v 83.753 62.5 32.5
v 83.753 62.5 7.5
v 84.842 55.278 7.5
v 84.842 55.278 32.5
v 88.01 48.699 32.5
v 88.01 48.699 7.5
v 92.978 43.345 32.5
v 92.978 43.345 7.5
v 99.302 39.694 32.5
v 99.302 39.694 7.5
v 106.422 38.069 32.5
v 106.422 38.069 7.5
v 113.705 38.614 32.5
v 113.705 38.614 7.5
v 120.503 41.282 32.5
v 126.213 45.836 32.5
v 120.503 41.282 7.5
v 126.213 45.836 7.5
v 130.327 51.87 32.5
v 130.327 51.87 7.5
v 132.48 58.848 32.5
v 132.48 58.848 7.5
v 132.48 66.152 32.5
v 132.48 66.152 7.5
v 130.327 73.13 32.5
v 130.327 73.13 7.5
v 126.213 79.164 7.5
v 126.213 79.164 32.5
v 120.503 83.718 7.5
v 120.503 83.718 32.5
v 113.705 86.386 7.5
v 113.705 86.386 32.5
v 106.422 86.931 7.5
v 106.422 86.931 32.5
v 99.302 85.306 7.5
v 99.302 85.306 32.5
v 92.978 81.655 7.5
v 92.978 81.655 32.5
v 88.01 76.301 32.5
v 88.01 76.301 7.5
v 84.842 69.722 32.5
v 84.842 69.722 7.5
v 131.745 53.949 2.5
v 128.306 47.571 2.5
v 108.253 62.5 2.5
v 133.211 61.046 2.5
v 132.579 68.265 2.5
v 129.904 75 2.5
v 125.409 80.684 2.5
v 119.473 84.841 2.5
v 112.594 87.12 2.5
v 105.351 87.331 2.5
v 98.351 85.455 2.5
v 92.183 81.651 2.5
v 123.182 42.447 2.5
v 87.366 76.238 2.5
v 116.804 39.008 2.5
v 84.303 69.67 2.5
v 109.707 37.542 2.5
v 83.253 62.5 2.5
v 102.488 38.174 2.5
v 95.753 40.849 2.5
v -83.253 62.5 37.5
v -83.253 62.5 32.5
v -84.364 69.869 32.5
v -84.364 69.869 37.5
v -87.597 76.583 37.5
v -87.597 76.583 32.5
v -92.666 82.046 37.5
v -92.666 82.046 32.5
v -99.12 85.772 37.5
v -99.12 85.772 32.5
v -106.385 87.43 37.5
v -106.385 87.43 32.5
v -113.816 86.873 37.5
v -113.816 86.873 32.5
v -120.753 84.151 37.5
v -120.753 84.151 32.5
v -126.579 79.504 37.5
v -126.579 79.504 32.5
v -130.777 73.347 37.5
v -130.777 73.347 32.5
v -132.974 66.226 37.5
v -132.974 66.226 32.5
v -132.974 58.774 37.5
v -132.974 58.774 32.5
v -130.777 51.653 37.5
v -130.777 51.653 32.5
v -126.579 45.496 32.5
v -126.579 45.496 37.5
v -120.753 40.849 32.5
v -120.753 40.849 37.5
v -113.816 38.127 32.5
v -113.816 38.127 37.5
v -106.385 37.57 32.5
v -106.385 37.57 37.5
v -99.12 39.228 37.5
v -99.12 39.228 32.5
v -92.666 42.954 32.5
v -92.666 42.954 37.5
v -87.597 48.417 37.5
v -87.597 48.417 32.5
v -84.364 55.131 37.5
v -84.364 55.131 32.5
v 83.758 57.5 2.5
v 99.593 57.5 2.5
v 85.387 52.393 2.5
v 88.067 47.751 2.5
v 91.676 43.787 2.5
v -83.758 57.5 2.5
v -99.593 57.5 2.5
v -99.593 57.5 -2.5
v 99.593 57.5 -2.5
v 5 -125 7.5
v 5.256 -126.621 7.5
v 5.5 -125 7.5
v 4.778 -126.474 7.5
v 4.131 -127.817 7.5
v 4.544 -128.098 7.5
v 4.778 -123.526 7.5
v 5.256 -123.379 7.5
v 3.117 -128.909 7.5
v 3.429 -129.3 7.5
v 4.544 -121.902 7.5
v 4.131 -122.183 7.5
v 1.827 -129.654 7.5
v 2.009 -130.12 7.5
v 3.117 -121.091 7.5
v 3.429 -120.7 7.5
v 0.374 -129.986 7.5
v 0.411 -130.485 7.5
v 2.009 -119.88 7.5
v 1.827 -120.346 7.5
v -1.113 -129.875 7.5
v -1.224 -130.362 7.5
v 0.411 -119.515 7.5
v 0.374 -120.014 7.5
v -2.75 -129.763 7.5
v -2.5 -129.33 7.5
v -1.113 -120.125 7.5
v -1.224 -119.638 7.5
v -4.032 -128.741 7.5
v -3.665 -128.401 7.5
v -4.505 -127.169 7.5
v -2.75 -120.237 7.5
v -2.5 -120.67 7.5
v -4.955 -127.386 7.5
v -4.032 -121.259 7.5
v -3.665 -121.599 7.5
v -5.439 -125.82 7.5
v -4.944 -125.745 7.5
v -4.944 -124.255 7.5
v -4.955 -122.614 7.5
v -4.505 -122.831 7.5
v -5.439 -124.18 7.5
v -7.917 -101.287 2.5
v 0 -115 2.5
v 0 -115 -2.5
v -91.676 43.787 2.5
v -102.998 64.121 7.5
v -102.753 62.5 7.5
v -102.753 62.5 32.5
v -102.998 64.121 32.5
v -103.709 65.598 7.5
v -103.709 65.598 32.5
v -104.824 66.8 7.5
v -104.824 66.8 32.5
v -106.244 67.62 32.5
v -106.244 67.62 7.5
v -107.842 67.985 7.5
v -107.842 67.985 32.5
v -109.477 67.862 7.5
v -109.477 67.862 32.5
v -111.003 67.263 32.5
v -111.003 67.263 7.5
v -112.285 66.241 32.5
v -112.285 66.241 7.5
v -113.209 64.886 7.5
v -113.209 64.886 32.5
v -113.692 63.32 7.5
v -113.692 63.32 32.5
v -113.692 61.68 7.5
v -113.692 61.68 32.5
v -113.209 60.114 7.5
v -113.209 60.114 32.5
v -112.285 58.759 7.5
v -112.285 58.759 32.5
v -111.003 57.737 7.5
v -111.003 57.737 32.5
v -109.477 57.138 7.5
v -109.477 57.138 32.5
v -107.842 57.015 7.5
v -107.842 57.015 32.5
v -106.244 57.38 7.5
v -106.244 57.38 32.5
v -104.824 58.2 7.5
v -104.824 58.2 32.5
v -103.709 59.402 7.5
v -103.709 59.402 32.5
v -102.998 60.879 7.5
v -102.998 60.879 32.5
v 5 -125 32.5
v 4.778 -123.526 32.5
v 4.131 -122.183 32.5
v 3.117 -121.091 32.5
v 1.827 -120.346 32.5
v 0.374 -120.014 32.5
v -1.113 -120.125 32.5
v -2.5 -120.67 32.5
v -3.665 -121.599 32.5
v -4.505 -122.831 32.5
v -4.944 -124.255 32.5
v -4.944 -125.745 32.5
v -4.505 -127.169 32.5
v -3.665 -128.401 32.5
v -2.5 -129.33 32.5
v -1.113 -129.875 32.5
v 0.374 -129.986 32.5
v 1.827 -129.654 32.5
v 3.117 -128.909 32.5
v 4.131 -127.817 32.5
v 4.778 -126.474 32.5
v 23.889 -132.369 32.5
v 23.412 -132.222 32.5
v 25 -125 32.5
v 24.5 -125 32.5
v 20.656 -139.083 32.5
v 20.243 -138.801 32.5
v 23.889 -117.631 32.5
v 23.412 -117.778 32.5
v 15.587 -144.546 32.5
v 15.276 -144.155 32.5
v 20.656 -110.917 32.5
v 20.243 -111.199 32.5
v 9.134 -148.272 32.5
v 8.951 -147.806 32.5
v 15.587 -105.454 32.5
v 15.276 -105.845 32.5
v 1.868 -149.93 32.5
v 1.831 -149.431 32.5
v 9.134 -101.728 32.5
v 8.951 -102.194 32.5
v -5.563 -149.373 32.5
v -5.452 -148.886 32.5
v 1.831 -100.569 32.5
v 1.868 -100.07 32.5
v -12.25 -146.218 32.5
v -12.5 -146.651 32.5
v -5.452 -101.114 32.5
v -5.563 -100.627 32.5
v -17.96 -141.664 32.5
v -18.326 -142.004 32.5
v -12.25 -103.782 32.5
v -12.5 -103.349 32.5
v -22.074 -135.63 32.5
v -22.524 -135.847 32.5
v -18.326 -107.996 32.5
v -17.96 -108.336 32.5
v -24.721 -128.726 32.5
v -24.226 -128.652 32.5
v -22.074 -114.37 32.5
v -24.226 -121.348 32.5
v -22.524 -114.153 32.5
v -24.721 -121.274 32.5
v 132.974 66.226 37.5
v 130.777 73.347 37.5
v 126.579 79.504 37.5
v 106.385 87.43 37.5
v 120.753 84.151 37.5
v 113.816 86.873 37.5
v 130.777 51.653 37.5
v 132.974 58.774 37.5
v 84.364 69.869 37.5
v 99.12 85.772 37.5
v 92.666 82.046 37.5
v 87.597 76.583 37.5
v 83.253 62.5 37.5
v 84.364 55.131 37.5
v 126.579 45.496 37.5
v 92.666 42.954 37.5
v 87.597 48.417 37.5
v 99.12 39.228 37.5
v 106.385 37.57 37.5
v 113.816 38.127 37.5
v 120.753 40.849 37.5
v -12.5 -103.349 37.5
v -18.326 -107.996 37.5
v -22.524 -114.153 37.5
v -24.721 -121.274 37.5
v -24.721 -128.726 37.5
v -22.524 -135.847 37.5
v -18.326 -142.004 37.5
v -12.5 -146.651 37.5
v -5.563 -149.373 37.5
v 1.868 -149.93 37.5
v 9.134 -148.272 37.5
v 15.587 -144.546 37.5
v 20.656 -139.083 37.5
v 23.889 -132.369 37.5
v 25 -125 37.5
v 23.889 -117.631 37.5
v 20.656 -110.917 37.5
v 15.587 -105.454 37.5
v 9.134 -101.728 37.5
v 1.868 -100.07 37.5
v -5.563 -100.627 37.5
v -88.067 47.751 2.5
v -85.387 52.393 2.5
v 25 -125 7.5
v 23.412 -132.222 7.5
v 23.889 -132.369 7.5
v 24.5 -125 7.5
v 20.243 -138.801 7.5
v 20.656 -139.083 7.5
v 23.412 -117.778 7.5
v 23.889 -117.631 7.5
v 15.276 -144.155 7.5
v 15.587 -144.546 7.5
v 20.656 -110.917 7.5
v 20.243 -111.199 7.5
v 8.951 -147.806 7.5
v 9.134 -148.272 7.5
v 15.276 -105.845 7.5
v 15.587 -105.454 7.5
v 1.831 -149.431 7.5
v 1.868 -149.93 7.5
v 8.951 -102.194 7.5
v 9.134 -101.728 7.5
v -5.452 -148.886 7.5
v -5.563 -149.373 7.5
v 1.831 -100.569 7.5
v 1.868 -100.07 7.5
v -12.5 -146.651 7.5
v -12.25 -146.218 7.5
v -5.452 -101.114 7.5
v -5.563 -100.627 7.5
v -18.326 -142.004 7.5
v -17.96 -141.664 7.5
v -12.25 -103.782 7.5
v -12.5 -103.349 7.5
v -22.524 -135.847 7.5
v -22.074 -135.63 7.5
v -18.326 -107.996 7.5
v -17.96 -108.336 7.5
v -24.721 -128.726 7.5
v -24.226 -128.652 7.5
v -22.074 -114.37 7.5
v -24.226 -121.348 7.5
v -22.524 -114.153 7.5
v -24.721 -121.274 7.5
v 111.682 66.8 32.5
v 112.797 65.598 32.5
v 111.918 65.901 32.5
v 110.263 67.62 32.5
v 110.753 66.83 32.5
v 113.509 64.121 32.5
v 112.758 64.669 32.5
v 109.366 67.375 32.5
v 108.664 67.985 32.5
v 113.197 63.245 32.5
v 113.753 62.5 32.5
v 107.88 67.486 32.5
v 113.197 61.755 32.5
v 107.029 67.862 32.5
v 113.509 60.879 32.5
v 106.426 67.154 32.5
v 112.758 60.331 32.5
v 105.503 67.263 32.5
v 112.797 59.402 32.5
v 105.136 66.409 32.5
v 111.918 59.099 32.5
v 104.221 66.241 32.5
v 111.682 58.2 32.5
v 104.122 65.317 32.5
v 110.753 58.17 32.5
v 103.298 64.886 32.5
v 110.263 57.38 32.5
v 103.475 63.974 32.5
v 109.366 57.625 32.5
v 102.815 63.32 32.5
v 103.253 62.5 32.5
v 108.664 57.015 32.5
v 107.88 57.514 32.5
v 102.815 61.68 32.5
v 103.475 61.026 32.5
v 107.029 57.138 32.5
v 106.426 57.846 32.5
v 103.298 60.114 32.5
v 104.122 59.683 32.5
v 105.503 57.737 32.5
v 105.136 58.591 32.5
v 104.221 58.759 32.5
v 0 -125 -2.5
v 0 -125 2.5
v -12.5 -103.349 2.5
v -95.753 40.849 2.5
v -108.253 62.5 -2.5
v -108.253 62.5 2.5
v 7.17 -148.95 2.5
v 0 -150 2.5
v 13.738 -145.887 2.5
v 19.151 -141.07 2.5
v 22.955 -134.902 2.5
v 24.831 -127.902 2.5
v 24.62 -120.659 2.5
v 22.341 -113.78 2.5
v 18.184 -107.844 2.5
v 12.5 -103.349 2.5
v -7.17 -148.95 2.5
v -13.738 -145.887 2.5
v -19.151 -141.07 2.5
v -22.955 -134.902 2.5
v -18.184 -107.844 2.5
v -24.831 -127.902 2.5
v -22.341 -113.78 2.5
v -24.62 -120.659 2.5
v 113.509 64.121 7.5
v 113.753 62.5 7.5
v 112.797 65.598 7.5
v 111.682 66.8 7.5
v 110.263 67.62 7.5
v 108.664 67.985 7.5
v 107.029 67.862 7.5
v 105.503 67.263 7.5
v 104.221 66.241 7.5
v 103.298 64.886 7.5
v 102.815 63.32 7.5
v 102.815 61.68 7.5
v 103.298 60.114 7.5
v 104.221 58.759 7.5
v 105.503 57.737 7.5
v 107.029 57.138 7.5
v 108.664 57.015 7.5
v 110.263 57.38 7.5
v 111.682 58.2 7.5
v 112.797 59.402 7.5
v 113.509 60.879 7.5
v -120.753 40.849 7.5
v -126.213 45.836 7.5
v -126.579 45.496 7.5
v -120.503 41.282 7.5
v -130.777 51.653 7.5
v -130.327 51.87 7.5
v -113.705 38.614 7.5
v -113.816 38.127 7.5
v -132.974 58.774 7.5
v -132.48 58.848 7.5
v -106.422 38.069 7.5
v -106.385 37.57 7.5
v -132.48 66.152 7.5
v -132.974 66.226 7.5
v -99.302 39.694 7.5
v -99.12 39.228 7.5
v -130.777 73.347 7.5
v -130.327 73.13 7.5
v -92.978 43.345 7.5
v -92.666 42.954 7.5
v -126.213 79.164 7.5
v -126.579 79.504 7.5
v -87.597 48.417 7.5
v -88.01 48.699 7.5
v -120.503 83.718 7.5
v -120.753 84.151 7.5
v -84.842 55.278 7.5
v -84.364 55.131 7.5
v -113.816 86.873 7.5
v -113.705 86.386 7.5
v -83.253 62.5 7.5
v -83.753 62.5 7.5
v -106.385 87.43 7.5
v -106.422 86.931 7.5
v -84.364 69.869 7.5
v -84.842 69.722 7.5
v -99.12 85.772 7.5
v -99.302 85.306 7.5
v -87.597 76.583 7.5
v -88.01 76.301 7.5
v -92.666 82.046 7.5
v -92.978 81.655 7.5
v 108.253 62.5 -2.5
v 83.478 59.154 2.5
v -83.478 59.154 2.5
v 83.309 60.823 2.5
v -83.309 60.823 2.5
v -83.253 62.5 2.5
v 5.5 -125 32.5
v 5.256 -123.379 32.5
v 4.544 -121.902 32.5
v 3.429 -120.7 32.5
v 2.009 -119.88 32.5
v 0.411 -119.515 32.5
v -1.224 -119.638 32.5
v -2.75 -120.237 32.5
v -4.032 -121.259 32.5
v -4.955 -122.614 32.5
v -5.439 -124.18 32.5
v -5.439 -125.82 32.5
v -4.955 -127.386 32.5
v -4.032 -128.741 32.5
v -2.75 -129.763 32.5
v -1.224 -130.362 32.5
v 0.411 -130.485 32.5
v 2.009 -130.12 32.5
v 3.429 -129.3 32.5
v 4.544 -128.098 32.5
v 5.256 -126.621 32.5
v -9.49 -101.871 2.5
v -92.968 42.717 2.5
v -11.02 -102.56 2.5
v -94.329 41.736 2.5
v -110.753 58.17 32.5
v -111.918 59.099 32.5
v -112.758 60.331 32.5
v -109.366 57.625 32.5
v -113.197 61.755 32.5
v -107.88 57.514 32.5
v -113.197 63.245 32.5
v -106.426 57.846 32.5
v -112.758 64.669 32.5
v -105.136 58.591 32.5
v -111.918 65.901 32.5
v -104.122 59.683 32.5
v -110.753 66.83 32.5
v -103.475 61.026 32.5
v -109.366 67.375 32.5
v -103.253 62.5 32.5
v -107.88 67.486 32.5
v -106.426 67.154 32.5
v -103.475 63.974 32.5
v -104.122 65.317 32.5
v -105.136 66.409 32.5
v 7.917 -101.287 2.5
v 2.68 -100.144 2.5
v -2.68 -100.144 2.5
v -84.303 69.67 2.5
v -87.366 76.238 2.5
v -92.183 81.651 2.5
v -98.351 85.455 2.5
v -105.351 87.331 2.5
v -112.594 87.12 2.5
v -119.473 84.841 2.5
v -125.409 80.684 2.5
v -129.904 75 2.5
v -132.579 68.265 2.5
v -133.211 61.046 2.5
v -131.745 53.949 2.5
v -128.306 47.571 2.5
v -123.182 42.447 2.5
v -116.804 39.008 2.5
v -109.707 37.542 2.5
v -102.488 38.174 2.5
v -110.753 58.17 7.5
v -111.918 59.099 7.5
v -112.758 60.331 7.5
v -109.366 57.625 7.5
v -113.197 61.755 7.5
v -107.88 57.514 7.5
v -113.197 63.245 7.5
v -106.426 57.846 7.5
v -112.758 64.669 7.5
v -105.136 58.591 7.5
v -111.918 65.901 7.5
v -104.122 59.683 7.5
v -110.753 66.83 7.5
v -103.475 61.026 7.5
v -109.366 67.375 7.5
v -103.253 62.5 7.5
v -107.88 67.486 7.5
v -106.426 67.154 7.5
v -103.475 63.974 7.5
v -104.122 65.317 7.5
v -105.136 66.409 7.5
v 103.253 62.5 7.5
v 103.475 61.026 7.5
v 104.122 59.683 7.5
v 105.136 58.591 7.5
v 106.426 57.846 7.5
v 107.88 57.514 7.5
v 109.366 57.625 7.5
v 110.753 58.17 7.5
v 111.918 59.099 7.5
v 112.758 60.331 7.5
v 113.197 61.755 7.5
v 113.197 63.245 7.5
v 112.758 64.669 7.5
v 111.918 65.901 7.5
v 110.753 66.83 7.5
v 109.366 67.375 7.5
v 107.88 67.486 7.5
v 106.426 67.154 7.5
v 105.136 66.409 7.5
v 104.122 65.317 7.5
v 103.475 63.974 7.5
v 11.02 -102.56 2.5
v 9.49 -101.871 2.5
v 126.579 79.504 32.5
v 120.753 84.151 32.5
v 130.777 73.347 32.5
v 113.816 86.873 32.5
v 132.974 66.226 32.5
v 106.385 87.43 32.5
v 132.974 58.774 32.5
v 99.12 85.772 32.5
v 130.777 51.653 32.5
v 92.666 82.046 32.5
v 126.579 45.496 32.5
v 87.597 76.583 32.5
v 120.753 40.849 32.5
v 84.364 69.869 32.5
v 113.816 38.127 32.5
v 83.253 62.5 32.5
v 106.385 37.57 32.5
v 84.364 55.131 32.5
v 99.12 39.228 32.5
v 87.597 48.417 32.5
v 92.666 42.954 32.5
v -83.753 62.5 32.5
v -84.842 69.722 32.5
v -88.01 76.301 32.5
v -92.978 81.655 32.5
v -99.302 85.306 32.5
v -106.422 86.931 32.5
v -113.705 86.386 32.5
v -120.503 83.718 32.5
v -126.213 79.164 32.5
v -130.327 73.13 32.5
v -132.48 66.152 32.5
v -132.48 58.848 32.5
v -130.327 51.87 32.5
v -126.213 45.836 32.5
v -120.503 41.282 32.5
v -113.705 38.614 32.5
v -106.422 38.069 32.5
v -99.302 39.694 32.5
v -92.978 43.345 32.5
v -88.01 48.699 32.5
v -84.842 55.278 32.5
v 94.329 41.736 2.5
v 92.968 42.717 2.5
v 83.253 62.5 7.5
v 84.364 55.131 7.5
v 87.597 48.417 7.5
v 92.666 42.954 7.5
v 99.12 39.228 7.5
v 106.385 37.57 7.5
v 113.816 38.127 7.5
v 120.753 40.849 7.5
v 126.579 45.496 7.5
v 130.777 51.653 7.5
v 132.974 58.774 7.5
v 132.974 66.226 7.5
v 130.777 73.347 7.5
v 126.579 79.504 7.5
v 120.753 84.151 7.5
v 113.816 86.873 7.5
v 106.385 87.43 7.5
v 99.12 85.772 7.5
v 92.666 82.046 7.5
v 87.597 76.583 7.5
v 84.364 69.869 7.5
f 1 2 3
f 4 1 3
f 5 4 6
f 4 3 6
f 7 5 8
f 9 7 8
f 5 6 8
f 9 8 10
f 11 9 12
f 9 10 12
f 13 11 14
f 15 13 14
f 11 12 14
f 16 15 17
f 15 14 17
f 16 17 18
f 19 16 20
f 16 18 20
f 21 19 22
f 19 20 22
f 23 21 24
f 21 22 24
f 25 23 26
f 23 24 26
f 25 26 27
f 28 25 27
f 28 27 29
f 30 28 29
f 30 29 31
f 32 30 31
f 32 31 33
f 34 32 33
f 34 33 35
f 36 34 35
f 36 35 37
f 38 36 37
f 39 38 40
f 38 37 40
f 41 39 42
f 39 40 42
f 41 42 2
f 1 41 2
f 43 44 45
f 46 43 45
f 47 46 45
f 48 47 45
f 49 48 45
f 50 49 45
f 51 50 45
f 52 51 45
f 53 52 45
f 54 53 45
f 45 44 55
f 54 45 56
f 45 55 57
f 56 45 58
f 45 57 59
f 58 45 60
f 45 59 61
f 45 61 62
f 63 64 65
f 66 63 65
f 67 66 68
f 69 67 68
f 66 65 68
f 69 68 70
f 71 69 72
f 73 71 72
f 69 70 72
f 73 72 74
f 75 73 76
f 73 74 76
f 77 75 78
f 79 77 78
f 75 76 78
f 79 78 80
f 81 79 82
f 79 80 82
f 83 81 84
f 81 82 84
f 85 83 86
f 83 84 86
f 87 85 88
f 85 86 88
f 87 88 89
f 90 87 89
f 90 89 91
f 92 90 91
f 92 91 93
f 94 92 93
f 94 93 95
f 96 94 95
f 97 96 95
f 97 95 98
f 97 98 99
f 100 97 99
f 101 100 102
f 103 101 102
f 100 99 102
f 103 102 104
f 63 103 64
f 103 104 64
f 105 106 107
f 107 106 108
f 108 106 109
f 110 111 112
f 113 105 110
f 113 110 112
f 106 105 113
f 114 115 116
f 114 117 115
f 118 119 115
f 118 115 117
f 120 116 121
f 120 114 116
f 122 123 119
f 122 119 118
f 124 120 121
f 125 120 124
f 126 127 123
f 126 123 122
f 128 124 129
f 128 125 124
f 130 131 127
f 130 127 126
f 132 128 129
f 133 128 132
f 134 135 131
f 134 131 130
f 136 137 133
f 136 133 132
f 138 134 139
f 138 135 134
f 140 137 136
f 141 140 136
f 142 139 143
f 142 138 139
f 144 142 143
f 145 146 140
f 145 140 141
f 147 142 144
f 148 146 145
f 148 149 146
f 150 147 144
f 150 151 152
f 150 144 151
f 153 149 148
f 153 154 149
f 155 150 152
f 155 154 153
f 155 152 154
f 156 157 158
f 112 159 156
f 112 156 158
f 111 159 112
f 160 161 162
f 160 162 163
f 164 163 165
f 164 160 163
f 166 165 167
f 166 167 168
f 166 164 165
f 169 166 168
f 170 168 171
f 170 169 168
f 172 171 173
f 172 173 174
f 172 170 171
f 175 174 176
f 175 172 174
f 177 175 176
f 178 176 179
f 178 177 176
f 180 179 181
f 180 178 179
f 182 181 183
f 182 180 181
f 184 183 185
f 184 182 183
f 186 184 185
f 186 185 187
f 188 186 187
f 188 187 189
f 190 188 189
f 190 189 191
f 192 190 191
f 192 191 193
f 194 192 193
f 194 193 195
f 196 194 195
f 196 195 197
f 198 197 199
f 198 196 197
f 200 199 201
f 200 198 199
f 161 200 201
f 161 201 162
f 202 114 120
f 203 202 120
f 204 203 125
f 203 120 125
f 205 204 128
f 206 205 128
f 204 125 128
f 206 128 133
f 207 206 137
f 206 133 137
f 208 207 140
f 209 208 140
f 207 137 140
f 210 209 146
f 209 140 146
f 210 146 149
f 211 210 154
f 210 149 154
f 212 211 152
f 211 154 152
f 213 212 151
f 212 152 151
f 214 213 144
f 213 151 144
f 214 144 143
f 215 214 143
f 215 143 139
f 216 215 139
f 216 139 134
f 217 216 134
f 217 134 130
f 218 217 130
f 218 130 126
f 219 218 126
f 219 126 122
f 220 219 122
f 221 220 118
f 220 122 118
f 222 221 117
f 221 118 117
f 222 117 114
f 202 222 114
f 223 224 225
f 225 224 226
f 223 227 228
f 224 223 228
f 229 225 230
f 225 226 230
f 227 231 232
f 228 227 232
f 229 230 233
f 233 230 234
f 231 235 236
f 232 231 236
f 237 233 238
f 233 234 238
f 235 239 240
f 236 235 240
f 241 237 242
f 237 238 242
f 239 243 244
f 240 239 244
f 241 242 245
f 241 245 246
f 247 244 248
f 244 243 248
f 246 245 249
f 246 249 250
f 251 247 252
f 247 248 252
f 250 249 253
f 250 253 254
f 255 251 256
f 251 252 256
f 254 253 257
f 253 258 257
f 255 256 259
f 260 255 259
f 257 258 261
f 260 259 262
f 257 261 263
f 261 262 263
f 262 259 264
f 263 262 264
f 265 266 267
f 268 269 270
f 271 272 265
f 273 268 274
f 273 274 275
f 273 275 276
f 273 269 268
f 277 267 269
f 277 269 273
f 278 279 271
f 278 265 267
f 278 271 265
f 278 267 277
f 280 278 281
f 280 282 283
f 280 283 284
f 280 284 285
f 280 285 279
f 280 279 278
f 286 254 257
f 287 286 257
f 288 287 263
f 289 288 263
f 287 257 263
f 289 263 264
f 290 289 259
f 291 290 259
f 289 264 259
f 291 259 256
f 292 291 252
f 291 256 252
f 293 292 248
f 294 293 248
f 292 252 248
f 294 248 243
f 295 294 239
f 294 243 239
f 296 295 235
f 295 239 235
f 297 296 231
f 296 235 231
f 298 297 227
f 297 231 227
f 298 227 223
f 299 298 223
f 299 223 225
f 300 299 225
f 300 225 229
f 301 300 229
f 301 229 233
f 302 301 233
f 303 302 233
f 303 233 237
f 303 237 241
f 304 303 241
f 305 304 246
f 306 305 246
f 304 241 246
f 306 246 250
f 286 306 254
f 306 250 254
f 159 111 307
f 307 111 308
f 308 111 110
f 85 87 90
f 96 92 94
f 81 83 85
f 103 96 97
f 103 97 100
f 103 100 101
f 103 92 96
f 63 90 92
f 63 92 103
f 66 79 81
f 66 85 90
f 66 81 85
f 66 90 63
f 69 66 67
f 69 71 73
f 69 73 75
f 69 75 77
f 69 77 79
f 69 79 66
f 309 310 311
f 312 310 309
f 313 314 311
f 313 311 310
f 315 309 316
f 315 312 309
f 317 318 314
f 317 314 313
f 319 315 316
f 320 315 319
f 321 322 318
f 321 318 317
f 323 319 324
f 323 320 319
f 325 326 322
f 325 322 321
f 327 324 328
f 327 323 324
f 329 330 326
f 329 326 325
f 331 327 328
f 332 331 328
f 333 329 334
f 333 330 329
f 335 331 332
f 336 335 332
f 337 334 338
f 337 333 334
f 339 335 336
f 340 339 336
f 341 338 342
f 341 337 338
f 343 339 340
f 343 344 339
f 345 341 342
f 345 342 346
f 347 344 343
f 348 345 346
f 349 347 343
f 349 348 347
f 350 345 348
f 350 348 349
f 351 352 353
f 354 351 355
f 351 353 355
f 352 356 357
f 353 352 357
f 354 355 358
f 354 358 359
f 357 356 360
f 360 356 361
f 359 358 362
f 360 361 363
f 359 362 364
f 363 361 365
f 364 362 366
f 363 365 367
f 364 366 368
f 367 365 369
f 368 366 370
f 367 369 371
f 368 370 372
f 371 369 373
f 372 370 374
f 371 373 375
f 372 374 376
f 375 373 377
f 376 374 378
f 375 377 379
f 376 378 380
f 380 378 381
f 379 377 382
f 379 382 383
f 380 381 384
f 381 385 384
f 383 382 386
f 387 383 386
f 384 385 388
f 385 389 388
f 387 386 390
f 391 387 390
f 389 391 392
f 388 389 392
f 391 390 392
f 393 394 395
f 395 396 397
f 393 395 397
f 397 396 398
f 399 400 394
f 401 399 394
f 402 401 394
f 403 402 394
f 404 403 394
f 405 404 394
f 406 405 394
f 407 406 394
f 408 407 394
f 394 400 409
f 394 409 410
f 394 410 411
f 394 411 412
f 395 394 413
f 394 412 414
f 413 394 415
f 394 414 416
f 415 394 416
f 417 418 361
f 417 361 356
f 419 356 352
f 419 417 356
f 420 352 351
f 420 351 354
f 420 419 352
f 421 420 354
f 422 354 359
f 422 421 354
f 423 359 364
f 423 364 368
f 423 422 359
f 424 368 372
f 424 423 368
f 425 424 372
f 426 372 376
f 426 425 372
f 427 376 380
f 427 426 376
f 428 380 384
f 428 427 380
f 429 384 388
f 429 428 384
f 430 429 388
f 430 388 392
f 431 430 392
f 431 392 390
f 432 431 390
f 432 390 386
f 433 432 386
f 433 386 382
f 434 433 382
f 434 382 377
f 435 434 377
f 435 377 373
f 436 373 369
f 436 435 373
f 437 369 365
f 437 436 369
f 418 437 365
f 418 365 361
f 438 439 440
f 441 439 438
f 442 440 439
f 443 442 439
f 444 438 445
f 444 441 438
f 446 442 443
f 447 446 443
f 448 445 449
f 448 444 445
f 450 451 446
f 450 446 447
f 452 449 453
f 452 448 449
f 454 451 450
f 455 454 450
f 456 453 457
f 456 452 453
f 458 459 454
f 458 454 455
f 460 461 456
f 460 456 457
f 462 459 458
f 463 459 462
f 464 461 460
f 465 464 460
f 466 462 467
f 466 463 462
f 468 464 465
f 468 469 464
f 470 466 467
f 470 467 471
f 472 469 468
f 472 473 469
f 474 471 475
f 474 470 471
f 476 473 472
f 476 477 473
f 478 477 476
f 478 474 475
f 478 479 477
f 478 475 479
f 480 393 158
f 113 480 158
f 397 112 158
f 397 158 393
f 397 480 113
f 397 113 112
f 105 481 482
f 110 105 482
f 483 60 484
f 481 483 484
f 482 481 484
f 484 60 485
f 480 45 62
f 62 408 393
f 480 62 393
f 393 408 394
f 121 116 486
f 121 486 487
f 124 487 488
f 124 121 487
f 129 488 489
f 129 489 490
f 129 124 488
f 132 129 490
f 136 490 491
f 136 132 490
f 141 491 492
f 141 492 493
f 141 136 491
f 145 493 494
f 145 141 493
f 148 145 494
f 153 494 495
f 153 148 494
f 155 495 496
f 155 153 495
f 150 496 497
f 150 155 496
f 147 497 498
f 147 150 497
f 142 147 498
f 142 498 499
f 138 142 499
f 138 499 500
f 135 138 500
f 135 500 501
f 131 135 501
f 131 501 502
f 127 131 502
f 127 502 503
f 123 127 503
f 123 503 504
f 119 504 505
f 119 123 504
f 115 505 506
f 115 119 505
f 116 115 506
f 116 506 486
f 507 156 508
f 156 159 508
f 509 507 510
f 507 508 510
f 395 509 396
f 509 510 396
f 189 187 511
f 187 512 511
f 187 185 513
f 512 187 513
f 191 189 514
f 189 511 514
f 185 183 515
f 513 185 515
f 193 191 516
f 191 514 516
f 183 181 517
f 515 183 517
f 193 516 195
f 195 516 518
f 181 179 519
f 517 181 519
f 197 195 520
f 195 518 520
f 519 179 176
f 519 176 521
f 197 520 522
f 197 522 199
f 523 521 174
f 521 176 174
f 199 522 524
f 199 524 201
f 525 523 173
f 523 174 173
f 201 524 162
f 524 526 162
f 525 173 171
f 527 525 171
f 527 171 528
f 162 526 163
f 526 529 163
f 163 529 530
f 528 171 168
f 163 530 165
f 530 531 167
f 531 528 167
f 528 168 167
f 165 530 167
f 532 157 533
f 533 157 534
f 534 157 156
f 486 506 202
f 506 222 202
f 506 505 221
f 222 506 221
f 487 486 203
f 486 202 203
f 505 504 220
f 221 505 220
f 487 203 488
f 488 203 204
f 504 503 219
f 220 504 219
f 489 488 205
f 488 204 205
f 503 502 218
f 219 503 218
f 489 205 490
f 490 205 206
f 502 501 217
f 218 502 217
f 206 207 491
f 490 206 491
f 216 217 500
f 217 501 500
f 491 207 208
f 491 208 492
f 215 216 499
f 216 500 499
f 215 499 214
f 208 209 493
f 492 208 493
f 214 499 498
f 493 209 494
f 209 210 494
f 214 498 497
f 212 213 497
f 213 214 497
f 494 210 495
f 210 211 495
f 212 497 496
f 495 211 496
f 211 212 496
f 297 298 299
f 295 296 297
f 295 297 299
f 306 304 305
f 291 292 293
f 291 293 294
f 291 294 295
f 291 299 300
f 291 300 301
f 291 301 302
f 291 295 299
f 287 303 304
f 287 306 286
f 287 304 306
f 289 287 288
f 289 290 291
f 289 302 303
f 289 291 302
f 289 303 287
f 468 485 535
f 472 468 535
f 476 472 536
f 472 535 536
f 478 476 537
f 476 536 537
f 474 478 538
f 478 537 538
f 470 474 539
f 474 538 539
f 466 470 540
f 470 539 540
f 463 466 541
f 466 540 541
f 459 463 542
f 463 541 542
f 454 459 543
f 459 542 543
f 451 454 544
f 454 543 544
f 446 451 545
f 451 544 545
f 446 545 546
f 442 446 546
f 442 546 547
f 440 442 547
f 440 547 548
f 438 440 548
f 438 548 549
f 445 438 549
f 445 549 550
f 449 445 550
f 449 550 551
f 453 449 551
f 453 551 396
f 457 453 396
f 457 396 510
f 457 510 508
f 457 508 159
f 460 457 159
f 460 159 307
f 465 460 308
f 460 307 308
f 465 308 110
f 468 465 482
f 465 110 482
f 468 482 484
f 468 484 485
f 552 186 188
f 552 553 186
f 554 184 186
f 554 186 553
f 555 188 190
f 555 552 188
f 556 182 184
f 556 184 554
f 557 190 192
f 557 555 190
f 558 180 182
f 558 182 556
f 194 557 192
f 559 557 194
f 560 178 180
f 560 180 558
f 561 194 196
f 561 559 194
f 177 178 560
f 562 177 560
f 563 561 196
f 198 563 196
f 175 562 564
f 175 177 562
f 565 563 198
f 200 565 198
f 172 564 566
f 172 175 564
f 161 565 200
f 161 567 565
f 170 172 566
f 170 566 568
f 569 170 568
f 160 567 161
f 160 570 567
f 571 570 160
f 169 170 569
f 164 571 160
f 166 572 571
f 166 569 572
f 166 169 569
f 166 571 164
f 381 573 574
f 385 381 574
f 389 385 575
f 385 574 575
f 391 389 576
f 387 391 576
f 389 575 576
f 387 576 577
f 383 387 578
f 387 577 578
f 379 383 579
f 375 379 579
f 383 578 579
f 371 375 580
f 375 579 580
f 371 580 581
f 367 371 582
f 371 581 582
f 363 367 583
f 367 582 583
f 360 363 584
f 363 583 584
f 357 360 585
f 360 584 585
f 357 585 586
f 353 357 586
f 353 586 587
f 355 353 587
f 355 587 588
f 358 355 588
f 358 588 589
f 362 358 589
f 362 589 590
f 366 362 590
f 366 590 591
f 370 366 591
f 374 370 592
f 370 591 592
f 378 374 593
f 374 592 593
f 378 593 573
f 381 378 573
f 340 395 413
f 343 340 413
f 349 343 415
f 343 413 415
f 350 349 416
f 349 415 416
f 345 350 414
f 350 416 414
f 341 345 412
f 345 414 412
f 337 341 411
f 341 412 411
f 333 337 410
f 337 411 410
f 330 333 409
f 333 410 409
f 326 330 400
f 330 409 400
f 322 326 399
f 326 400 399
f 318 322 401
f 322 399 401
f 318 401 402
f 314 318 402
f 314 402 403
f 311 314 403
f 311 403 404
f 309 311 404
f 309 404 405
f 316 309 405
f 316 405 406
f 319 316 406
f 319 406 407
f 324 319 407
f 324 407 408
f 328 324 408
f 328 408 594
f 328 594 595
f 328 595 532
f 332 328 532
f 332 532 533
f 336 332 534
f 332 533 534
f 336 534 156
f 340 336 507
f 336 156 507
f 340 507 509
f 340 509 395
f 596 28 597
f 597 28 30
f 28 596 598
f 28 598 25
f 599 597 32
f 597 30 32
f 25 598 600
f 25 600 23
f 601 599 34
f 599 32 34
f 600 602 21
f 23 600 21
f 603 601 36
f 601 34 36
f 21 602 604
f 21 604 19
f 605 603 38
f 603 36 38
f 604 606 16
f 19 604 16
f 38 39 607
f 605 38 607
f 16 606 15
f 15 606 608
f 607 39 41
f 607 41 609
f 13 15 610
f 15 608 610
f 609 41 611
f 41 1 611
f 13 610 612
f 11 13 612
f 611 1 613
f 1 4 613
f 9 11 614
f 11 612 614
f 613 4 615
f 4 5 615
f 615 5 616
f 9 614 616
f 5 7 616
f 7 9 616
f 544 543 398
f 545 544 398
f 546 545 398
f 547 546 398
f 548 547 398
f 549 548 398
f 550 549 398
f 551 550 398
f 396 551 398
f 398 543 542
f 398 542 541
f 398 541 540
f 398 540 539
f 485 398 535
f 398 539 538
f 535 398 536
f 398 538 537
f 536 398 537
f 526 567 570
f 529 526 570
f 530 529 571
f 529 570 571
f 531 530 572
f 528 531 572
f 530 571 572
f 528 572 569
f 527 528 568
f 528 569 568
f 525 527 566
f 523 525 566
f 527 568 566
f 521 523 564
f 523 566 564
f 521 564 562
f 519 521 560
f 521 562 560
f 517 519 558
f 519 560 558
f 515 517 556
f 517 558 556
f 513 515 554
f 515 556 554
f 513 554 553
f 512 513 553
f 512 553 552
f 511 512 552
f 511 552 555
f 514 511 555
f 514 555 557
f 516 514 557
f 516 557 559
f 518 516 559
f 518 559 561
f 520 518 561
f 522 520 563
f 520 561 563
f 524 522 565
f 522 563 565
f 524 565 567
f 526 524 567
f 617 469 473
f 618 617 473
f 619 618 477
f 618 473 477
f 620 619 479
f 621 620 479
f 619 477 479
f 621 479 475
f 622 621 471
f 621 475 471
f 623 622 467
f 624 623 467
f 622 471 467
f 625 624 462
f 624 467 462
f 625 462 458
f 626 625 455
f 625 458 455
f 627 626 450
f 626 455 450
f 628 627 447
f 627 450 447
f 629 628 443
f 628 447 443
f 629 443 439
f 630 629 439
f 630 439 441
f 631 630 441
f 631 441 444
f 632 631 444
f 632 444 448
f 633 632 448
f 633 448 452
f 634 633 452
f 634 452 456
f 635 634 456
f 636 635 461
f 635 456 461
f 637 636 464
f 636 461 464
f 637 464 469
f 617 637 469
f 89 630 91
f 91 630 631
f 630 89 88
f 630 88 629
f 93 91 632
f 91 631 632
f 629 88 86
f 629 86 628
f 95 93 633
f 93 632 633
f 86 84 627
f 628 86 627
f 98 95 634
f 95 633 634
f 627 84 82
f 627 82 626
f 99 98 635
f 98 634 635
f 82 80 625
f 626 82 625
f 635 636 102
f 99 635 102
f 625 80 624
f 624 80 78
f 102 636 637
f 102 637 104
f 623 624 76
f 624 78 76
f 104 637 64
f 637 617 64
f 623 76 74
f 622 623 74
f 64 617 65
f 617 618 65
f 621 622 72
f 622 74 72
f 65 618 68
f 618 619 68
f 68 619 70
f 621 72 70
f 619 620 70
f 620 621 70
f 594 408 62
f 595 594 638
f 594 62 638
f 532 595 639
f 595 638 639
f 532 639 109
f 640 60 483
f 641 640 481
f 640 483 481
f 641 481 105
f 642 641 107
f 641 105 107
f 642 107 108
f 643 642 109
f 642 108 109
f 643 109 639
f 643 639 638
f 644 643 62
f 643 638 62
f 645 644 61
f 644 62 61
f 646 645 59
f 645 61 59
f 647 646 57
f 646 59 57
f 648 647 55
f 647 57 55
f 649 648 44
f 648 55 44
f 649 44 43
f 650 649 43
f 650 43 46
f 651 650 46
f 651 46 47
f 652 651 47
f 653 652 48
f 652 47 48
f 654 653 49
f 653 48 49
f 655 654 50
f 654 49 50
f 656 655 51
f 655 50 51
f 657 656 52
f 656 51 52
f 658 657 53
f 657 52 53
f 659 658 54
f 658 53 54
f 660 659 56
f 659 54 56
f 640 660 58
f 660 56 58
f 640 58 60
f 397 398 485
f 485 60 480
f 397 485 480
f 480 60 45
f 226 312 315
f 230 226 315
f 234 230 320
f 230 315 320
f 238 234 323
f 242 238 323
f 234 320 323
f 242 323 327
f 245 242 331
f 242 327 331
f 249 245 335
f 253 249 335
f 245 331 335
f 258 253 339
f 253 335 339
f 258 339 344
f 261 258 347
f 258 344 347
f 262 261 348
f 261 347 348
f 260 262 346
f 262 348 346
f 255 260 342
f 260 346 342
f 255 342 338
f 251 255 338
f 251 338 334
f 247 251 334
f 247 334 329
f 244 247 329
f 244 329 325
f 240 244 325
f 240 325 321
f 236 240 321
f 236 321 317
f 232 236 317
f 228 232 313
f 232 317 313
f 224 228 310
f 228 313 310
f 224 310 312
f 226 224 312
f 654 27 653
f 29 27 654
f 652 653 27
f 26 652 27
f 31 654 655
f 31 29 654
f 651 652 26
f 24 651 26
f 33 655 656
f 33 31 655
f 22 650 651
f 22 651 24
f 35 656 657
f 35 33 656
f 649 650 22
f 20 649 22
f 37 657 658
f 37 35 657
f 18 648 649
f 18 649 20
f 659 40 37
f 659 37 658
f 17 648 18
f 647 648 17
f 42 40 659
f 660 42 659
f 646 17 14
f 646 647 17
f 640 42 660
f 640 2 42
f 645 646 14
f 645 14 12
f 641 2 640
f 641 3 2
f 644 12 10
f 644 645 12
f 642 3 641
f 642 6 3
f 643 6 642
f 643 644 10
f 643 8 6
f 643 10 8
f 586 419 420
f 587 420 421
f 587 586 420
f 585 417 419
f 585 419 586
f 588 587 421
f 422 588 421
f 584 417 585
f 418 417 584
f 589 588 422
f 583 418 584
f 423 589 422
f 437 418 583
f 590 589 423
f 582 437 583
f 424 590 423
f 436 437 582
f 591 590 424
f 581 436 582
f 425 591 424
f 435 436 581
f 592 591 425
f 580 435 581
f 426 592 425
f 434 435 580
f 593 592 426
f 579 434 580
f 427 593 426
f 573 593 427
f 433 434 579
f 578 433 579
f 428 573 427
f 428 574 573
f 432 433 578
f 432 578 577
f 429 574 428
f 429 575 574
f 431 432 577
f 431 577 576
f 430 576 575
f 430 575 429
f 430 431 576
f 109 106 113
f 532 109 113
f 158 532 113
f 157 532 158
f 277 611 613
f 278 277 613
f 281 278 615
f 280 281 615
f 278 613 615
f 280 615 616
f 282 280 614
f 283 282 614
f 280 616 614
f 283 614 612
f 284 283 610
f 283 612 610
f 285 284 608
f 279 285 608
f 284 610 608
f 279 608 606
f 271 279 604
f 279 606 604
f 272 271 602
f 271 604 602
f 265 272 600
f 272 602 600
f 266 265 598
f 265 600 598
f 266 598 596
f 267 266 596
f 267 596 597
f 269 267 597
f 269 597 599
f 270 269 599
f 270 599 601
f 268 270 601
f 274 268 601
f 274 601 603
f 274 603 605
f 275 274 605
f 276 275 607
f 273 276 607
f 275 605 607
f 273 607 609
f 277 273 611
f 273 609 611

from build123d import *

# Parameters (mm, degrees)
BOSS_EXTRUDE1_DEPTH = 2.5
SKETCH2_R           = 25
BOSS_EXTRUDE2_DEPTH = 5
SKETCH3_R           = 5
BOSS_EXTRUDE3_DEPTH = 25
SKETCH4_R           = 25
BOSS_EXTRUDE4_DEPTH = 5
SKETCH5_R           = 24.5
SKETCH5_R_2         = 5.5
BOSS_EXTRUDE5_DEPTH = 25


with BuildPart() as part:
    # Sketch1 → Boss-Extrude1 (new, symmetric)
    with BuildSketch(Plane.XY):
        Polygon((0, -125), (-108.253175473, 62.5), (108.253175473, 62.5), align=None)
        Polygon((0, -115), (-99.592921435, 57.5), (99.592921435, 57.5), align=None, mode=Mode.SUBTRACT)
    extrude(amount=BOSS_EXTRUDE1_DEPTH, both=True)

    # Sketch2 → Boss-Extrude2 (add)
    with BuildSketch(Plane.XY.offset(2.5)):
        with Locations((-108.253175473, 62.5)):
            Circle(SKETCH2_R)
        with Locations(Location((108.253175473, 62.5, 0), (0, 0, 180))):
            Circle(SKETCH2_R)
        with Locations(Location((0, -125, 0), (0, 0, 120))):
            Circle(SKETCH2_R)
    extrude(amount=BOSS_EXTRUDE2_DEPTH)

    # Sketch3 → Boss-Extrude3 (add)
    with BuildSketch(Plane.XY.offset(7.5)):
        with Locations((-108.253175473, 62.5)):
            Circle(SKETCH3_R)
        with Locations(Location((108.253175473, 62.5, 0), (0, 0, 180))):
            Circle(SKETCH3_R)
        with Locations((0, -125)):
            Circle(SKETCH3_R)
    extrude(amount=BOSS_EXTRUDE3_DEPTH)

    # Sketch4 → Boss-Extrude4 (add)
    with BuildSketch(Plane.XY.offset(32.5)):
        with Locations(Location((0, -125, 0), (0, 0, 120))):
            Circle(SKETCH4_R)
        with Locations(Location((108.253175473, 62.5, 0), (0, 0, 180))):
            Circle(SKETCH4_R)
        with Locations((-108.253175473, 62.5)):
            Circle(SKETCH4_R)
    extrude(amount=BOSS_EXTRUDE4_DEPTH)

    # Sketch5 → Boss-Extrude5 (add)
    # profile 1 of 3: a face of its own
    with BuildSketch(Plane.XY.offset(7.5)):
        with Locations((-108.253175473, 62.5)):
            Circle(SKETCH5_R)
        with Locations((-108.253175473, 62.5)):
            Circle(SKETCH5_R_2, mode=Mode.SUBTRACT)
    # profile 2 of 3: a face of its own
    with BuildSketch(Plane.XY.offset(7.5)):
        with Locations(Location((108.253175473, 62.5, 0), (0, 0, 180))):
            Circle(SKETCH5_R)
        with Locations((108.253175473, 62.5)):
            Circle(SKETCH5_R_2, mode=Mode.SUBTRACT)
    # profile 3 of 3: a face of its own
    with BuildSketch(Plane.XY.offset(7.5)):
        with Locations((0, -125)):
            Circle(SKETCH5_R)
        with Locations((0, -125)):
            Circle(SKETCH5_R_2, mode=Mode.SUBTRACT)
    extrude(amount=BOSS_EXTRUDE5_DEPTH)


solid = part.part
